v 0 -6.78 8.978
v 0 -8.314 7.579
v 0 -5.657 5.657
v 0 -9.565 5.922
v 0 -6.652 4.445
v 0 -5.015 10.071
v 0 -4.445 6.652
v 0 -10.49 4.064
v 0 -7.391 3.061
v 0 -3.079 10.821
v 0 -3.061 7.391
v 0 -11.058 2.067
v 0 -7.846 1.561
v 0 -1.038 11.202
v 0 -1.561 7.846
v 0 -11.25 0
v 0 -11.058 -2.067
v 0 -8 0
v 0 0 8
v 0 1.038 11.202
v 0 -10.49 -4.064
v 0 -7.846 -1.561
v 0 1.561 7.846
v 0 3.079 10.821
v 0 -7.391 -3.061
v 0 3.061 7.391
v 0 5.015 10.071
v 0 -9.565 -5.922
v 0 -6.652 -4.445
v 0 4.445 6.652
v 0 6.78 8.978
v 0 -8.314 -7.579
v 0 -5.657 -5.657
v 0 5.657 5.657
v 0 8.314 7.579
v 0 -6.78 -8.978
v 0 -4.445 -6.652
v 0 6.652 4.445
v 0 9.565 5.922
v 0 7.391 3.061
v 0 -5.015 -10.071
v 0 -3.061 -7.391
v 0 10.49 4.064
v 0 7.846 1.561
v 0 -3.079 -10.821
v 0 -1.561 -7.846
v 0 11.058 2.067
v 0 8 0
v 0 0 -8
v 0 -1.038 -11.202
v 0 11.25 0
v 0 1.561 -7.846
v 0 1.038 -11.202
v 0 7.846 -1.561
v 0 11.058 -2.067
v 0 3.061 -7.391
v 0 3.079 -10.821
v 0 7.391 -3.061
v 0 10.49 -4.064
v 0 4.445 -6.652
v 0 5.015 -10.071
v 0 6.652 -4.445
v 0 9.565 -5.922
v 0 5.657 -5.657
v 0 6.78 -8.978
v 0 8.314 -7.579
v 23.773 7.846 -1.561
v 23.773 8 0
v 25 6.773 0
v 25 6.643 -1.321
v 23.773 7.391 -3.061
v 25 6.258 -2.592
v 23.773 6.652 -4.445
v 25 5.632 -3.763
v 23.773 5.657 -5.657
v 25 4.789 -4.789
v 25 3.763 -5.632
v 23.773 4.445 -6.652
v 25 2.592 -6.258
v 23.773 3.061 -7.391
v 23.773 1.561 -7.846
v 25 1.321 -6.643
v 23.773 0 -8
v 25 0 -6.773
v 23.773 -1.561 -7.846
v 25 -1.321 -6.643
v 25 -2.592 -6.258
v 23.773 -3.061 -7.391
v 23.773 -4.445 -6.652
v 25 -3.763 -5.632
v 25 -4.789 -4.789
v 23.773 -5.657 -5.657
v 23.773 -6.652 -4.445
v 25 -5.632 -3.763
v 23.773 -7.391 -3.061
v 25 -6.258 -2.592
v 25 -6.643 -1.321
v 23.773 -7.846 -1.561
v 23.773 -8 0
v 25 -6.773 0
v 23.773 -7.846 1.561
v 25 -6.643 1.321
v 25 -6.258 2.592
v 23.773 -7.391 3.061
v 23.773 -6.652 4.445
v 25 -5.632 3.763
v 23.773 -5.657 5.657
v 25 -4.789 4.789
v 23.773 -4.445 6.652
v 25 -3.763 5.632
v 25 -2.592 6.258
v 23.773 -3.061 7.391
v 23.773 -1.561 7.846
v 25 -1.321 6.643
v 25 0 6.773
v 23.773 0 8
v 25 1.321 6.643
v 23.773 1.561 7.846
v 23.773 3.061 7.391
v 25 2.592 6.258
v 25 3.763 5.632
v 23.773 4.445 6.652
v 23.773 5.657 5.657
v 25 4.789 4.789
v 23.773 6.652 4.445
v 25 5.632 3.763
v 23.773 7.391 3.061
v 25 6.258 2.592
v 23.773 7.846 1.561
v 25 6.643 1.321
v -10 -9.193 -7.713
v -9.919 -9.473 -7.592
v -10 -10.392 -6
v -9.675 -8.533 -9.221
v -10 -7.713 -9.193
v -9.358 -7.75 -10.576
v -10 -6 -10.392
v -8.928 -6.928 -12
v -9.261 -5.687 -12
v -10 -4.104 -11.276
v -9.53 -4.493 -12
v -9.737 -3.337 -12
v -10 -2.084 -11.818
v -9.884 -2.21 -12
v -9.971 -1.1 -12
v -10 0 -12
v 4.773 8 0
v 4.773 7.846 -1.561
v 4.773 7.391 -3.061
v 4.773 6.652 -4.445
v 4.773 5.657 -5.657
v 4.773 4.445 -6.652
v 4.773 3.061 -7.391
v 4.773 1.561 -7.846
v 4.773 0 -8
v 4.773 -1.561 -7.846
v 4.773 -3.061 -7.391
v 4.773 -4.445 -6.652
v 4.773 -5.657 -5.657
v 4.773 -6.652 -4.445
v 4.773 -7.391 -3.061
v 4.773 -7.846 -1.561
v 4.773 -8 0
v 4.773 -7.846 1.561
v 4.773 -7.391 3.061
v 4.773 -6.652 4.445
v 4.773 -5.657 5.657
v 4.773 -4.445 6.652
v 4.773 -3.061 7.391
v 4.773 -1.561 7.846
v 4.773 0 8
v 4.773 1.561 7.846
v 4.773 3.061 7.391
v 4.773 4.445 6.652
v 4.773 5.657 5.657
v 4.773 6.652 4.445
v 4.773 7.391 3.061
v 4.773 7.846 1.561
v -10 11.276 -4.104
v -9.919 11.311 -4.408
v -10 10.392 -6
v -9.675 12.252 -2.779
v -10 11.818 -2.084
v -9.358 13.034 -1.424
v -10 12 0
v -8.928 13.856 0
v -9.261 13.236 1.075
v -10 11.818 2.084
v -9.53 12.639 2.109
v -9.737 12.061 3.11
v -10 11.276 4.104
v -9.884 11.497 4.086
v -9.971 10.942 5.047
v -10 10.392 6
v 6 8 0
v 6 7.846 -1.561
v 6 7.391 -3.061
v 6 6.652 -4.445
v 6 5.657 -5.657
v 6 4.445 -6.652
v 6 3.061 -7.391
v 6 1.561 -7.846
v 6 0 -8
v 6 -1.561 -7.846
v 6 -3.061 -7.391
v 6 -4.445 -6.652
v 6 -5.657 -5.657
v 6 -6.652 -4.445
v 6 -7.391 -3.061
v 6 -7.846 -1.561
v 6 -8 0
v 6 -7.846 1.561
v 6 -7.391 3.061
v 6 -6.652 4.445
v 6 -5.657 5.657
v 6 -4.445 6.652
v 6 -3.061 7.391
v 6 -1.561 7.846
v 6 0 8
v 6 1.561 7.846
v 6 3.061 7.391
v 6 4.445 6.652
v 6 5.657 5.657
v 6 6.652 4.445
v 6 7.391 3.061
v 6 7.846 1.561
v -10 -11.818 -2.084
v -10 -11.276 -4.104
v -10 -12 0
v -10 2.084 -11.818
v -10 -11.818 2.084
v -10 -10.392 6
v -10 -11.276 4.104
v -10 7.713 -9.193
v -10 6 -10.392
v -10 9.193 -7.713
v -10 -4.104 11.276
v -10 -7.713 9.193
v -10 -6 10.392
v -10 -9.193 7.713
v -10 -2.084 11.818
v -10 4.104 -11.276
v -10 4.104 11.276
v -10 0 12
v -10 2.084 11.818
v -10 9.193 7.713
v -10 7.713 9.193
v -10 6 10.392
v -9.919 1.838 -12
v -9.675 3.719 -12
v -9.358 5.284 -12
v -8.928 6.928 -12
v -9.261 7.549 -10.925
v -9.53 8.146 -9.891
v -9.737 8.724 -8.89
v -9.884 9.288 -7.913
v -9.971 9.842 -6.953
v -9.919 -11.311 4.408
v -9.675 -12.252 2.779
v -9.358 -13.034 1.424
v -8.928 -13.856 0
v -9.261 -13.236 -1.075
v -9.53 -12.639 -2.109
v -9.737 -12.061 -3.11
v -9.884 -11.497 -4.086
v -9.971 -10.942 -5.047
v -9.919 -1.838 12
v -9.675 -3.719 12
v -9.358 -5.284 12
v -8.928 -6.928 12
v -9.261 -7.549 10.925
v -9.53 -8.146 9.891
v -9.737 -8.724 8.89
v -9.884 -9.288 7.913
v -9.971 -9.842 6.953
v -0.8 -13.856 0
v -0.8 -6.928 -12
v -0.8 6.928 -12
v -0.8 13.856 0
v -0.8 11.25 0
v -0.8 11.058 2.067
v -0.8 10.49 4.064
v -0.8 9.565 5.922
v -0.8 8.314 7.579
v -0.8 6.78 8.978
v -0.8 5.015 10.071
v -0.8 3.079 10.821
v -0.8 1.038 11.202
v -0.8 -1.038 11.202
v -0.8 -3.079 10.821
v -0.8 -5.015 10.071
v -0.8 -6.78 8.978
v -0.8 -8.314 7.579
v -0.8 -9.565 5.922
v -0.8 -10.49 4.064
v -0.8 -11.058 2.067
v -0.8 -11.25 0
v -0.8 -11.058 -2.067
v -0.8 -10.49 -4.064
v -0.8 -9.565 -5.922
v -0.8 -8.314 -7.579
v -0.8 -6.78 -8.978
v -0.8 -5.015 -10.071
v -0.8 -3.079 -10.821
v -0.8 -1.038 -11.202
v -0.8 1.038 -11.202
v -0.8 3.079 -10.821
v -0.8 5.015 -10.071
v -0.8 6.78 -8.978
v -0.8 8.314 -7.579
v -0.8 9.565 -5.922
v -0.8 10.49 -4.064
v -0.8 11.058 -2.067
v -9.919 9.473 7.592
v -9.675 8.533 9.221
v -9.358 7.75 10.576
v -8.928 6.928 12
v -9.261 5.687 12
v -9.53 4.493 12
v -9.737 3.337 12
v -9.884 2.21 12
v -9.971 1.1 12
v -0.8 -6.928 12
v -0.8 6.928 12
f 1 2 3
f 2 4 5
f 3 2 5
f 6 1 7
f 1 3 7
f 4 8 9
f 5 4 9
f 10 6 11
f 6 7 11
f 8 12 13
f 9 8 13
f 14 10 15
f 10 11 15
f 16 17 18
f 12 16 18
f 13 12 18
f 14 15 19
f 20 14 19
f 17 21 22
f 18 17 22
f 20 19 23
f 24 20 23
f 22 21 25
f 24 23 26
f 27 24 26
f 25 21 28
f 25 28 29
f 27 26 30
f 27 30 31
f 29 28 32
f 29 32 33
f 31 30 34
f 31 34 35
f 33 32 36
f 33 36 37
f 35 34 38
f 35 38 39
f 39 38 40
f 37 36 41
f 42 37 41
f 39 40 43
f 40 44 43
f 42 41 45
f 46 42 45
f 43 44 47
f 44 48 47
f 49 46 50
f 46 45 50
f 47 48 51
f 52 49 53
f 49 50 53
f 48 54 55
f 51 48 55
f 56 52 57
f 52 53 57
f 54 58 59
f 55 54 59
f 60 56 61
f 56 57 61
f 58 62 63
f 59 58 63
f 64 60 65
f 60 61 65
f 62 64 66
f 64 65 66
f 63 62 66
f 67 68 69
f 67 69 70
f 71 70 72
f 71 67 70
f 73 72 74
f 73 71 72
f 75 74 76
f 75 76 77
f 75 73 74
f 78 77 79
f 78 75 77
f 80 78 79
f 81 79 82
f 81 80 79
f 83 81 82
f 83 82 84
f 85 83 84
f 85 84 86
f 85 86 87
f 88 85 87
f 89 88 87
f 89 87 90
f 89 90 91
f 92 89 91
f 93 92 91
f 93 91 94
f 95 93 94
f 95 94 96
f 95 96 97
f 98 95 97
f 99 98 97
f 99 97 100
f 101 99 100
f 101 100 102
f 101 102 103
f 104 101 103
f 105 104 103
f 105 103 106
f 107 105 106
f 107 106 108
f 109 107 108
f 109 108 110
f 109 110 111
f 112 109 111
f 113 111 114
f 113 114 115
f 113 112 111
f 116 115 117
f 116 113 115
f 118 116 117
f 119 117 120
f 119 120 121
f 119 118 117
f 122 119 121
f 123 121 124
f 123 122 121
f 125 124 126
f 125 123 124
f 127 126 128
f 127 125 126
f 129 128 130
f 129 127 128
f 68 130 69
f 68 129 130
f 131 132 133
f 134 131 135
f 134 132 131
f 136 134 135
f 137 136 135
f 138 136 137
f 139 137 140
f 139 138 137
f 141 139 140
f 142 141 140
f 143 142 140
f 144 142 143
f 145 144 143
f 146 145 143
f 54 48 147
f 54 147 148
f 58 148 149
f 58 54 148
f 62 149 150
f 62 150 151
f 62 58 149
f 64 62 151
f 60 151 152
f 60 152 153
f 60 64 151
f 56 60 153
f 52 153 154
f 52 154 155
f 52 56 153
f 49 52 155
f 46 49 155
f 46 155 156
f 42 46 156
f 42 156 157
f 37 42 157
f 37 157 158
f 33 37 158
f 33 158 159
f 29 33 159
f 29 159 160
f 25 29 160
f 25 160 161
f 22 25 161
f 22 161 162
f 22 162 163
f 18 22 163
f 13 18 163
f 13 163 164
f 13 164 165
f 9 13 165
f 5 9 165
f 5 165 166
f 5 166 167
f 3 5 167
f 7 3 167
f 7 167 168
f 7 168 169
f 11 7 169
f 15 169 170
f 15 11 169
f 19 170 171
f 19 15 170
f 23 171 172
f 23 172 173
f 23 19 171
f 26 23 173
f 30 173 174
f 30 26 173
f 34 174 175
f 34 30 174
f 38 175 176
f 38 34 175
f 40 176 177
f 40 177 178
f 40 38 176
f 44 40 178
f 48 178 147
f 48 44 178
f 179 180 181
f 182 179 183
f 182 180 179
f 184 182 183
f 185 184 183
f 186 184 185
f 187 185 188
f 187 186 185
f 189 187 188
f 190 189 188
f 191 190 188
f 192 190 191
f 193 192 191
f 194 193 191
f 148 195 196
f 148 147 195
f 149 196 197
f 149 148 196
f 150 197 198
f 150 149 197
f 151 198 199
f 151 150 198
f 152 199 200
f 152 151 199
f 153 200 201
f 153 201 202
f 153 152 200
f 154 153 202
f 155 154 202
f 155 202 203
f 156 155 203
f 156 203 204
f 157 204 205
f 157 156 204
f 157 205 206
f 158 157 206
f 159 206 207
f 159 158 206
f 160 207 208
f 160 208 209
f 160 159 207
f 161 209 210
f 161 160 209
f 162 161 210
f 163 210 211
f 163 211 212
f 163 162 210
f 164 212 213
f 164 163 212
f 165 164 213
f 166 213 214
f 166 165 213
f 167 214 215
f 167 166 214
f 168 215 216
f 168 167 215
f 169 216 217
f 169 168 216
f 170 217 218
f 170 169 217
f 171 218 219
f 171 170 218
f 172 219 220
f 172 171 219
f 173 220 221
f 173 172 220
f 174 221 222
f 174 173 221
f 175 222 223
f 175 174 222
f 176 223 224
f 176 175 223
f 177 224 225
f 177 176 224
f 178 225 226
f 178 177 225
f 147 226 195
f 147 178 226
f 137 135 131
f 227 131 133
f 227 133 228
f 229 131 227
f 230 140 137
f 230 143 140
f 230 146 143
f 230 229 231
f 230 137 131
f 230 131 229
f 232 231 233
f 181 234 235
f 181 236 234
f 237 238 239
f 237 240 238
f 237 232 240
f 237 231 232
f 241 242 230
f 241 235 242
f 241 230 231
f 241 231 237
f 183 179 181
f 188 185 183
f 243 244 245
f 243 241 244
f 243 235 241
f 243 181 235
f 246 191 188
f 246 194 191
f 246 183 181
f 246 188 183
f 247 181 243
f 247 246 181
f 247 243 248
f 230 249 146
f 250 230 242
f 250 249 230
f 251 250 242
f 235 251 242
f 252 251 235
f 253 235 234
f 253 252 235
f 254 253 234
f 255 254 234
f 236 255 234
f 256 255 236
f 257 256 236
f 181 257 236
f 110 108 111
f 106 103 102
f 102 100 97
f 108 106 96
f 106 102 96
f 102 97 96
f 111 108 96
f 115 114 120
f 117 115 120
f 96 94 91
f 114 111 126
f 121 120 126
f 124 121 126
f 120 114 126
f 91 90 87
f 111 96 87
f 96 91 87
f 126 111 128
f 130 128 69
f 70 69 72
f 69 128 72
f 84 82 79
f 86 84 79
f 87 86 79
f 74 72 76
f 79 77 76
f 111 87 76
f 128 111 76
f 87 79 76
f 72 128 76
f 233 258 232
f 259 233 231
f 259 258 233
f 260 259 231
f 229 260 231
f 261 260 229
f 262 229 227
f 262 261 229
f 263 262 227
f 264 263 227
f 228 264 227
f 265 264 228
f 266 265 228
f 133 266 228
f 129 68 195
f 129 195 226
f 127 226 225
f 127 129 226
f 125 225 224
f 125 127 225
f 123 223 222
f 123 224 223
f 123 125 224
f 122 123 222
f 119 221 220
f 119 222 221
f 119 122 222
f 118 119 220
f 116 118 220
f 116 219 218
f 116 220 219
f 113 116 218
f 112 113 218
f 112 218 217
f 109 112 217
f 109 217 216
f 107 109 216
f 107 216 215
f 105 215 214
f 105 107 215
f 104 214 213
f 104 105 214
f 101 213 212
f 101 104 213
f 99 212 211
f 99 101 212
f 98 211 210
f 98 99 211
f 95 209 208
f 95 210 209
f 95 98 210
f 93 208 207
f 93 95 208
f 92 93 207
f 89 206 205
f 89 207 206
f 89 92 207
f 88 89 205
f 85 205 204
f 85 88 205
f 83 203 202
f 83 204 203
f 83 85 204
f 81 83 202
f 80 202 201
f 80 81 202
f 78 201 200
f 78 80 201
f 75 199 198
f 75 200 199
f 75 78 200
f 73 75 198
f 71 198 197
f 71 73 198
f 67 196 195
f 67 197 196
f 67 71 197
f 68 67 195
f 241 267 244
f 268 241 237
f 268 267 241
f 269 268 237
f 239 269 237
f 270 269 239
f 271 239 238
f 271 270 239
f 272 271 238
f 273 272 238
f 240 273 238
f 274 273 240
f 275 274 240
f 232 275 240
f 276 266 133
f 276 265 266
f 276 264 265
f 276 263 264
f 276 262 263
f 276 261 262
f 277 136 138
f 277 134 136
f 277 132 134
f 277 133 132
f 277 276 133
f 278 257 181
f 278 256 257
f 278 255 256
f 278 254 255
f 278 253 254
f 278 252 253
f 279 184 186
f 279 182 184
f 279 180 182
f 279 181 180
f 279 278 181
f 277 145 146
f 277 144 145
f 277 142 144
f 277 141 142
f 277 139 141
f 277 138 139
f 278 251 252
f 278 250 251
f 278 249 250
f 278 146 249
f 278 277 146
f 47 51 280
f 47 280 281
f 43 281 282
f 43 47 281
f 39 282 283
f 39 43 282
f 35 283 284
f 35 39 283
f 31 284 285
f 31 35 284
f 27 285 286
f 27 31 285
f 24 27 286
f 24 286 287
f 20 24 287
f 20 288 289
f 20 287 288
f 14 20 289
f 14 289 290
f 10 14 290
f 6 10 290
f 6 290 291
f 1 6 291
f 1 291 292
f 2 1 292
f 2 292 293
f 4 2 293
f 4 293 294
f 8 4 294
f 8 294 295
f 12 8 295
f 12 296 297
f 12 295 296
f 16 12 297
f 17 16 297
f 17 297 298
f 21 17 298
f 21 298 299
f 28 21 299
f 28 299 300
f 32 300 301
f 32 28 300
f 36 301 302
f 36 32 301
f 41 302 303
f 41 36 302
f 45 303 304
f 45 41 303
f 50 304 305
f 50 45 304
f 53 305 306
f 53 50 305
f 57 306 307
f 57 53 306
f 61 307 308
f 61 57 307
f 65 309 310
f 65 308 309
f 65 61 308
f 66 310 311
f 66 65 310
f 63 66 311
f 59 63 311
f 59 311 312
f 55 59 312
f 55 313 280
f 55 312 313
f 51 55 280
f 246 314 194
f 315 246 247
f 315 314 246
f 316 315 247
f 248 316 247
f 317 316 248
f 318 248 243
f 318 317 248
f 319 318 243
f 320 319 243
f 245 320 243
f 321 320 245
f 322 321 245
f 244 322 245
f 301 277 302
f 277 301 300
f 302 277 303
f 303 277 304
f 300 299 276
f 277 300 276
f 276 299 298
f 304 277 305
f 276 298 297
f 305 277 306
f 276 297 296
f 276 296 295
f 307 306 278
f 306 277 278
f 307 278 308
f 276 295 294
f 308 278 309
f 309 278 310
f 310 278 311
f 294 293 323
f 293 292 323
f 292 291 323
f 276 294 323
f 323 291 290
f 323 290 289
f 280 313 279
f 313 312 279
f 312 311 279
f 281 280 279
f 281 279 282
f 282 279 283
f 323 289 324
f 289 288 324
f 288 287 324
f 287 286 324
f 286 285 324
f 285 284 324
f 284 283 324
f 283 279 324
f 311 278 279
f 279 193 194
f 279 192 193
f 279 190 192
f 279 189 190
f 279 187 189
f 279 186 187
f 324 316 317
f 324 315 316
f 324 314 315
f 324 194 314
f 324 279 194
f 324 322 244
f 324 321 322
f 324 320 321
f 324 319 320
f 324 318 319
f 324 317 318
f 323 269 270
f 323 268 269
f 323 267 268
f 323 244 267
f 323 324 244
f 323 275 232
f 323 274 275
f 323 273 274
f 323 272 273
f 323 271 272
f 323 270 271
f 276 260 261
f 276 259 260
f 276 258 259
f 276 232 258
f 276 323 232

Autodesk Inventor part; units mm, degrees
ref_plane "YZ Plane" through (0, 0, 0) normal (1, 0, 0) x (0, 1, 0)
ref_plane "XZ Plane" through (0, 0, 0) normal (0, 1, 0) x (-1, 0, 0)
sketch "Sketch1" plane through (0, 0, 0) normal (0, 0, 1) x (1, 0, 0)
  line L0 (0, 11.25) -> (0, 8)
  line L1 (6, 8) -> (25, 8)
  line L2 (25, 8) -> (25, 0)
  line L3 (25, 0) -> (-0.8001, 0)
  line L4 (-5.9601, 0) -> (30.16, 0) projected
  line L5 (-0.8001, 0) -> (-0.8001, 11.25)
  line L6 (-0.8001, 11.25) -> (0, 11.25)
  line L7 (6, 8) -> (4.773, 8)
  line L8 (4.773, 8) -> (0, 8)
  line L9 (0, -2.25) -> (0, 13.5) projected
  dimension "d0" = 25
  dimension "d1" = 19
  dimension "d2" = 16
  dimension "d9" = 0.8001
  dimension "d10" = 22.5
  dimension "d13" = 1.227
  dimension "d14" = 16
revolve "Body" add sketch "Sketch1" angle 360 about axis through (25, 0, 0) along (-1, 0, 0)
sketch "Sketch2" plane through (-0.8001, 0, 0) normal (-1, 0, 0) x (0, 0, 1)
  line L0 (0, 13.8564) -> (12, 6.9282)
  line L1 (12, 6.9282) -> (12, -6.9282)
  line L2 (12, -6.9282) -> (0, -13.8564)
  line L3 (0, -13.8564) -> (-12, -6.9282)
  line L4 (-12, -6.9282) -> (-12, 6.9282)
  line L5 (-12, 6.9282) -> (0, 13.8564)
  point P0 (0, 0)
  point P1 (0, 0)
  dimension "d11" = 24
extrude "Head" add sketch "Sketch2" along normal blind 9.2
sketch "Sketch4" plane through (0, 0, 0) normal (0, 0, 1) x (1, 0, 0)
  line L0 (-10.0001, 12) -> (-10.0001, 13.8564)
  line L1 (-10.0001, 13.8564) -> (-8.9283, 13.8564)
  line L2 (-8.9283, 13.8564) -> (-10.0001, 12)
  line L3 (-11.8401, 0) -> (1.0399, 0) projected
  line L4 (-0.8001, 13.8564) -> (-10.0001, 13.8564) projected
  line L5 (-10.0001, 6.9282) -> (-10.0001, 13.8564) projected
  dimension "d5" = 30
  dimension "d19" = 24
revolve "Chamfer1" cut sketch "Sketch4" angle 360 about axis through (-10, 0, 0) along (1, 0, 0)
thread "Thread" size "M16x2" class "6g" standard "ISO Metric profile" length 19
chamfer "Chamfer2" distance 1.2269 distance2 1.227 1 edges at (25, -8, 0) measured on face at (25, -1.5148, -1.342)
ref_plane "Work Plane1" through (1.525, 0, 0) normal (0, 0, 1) x (1, 0, 0)
equation "\"d0\" = NLG"
equation "\"d1\" = GEL"
equation "\"d2\" = GD"
equation "\"d10\" = SD2"
equation "\"d14\" = BDM"
equation "\"d11\" = SW"
equation "\"d3\" = KOH - SD"
equation "\"d5\" = ANG1"
equation "\"d19\" = SW0"
equation "\"d15\" = GEL"
equation "\"d6\" = -0.5 * SPD + 0.5 * GD"
equation "\"NLG\" = 25"
equation "\"GD\" = NND"
equation "\"BDM\" = NND"
equation "\"KOH\" = 10"
equation "\"GEL\" = 19"
equation "\"SW\" = 24"
equation "\"SW0\" = SW"
equation "\"SPD\" = NND - 1.2269 * PTC"
equation "\"SD2\" = SDH"
equation "\"SD\" = 0.8"
equation "\"ANG1\" = 30deg"
equation "\"GAL\" = 0.61345 * PTC"
equation "\"GUL\" = 0.61345 * PTC"
equation "\"RR\" = 0.6"
equation "\"WFT\" = SD"
equation "\"GD1\" = THREADDIA - 1.2269 * PTC"
equation "\"THREADDIA\" = 16"
equation "\"SDH\" = 22.5"
equation "\"SDHG\" = GAL"
equation "\"TOA\" = 30deg"
equation "\"FAWI\" = 45deg"
equation "\"PTC\" = 2"
equation "\"NND\" = 16"
equation "\"E0\" = 1.155 * SW"
properties part number "Bolt M16x25-8.8-A PN-85/M-82105" material "Steel, Mild"
